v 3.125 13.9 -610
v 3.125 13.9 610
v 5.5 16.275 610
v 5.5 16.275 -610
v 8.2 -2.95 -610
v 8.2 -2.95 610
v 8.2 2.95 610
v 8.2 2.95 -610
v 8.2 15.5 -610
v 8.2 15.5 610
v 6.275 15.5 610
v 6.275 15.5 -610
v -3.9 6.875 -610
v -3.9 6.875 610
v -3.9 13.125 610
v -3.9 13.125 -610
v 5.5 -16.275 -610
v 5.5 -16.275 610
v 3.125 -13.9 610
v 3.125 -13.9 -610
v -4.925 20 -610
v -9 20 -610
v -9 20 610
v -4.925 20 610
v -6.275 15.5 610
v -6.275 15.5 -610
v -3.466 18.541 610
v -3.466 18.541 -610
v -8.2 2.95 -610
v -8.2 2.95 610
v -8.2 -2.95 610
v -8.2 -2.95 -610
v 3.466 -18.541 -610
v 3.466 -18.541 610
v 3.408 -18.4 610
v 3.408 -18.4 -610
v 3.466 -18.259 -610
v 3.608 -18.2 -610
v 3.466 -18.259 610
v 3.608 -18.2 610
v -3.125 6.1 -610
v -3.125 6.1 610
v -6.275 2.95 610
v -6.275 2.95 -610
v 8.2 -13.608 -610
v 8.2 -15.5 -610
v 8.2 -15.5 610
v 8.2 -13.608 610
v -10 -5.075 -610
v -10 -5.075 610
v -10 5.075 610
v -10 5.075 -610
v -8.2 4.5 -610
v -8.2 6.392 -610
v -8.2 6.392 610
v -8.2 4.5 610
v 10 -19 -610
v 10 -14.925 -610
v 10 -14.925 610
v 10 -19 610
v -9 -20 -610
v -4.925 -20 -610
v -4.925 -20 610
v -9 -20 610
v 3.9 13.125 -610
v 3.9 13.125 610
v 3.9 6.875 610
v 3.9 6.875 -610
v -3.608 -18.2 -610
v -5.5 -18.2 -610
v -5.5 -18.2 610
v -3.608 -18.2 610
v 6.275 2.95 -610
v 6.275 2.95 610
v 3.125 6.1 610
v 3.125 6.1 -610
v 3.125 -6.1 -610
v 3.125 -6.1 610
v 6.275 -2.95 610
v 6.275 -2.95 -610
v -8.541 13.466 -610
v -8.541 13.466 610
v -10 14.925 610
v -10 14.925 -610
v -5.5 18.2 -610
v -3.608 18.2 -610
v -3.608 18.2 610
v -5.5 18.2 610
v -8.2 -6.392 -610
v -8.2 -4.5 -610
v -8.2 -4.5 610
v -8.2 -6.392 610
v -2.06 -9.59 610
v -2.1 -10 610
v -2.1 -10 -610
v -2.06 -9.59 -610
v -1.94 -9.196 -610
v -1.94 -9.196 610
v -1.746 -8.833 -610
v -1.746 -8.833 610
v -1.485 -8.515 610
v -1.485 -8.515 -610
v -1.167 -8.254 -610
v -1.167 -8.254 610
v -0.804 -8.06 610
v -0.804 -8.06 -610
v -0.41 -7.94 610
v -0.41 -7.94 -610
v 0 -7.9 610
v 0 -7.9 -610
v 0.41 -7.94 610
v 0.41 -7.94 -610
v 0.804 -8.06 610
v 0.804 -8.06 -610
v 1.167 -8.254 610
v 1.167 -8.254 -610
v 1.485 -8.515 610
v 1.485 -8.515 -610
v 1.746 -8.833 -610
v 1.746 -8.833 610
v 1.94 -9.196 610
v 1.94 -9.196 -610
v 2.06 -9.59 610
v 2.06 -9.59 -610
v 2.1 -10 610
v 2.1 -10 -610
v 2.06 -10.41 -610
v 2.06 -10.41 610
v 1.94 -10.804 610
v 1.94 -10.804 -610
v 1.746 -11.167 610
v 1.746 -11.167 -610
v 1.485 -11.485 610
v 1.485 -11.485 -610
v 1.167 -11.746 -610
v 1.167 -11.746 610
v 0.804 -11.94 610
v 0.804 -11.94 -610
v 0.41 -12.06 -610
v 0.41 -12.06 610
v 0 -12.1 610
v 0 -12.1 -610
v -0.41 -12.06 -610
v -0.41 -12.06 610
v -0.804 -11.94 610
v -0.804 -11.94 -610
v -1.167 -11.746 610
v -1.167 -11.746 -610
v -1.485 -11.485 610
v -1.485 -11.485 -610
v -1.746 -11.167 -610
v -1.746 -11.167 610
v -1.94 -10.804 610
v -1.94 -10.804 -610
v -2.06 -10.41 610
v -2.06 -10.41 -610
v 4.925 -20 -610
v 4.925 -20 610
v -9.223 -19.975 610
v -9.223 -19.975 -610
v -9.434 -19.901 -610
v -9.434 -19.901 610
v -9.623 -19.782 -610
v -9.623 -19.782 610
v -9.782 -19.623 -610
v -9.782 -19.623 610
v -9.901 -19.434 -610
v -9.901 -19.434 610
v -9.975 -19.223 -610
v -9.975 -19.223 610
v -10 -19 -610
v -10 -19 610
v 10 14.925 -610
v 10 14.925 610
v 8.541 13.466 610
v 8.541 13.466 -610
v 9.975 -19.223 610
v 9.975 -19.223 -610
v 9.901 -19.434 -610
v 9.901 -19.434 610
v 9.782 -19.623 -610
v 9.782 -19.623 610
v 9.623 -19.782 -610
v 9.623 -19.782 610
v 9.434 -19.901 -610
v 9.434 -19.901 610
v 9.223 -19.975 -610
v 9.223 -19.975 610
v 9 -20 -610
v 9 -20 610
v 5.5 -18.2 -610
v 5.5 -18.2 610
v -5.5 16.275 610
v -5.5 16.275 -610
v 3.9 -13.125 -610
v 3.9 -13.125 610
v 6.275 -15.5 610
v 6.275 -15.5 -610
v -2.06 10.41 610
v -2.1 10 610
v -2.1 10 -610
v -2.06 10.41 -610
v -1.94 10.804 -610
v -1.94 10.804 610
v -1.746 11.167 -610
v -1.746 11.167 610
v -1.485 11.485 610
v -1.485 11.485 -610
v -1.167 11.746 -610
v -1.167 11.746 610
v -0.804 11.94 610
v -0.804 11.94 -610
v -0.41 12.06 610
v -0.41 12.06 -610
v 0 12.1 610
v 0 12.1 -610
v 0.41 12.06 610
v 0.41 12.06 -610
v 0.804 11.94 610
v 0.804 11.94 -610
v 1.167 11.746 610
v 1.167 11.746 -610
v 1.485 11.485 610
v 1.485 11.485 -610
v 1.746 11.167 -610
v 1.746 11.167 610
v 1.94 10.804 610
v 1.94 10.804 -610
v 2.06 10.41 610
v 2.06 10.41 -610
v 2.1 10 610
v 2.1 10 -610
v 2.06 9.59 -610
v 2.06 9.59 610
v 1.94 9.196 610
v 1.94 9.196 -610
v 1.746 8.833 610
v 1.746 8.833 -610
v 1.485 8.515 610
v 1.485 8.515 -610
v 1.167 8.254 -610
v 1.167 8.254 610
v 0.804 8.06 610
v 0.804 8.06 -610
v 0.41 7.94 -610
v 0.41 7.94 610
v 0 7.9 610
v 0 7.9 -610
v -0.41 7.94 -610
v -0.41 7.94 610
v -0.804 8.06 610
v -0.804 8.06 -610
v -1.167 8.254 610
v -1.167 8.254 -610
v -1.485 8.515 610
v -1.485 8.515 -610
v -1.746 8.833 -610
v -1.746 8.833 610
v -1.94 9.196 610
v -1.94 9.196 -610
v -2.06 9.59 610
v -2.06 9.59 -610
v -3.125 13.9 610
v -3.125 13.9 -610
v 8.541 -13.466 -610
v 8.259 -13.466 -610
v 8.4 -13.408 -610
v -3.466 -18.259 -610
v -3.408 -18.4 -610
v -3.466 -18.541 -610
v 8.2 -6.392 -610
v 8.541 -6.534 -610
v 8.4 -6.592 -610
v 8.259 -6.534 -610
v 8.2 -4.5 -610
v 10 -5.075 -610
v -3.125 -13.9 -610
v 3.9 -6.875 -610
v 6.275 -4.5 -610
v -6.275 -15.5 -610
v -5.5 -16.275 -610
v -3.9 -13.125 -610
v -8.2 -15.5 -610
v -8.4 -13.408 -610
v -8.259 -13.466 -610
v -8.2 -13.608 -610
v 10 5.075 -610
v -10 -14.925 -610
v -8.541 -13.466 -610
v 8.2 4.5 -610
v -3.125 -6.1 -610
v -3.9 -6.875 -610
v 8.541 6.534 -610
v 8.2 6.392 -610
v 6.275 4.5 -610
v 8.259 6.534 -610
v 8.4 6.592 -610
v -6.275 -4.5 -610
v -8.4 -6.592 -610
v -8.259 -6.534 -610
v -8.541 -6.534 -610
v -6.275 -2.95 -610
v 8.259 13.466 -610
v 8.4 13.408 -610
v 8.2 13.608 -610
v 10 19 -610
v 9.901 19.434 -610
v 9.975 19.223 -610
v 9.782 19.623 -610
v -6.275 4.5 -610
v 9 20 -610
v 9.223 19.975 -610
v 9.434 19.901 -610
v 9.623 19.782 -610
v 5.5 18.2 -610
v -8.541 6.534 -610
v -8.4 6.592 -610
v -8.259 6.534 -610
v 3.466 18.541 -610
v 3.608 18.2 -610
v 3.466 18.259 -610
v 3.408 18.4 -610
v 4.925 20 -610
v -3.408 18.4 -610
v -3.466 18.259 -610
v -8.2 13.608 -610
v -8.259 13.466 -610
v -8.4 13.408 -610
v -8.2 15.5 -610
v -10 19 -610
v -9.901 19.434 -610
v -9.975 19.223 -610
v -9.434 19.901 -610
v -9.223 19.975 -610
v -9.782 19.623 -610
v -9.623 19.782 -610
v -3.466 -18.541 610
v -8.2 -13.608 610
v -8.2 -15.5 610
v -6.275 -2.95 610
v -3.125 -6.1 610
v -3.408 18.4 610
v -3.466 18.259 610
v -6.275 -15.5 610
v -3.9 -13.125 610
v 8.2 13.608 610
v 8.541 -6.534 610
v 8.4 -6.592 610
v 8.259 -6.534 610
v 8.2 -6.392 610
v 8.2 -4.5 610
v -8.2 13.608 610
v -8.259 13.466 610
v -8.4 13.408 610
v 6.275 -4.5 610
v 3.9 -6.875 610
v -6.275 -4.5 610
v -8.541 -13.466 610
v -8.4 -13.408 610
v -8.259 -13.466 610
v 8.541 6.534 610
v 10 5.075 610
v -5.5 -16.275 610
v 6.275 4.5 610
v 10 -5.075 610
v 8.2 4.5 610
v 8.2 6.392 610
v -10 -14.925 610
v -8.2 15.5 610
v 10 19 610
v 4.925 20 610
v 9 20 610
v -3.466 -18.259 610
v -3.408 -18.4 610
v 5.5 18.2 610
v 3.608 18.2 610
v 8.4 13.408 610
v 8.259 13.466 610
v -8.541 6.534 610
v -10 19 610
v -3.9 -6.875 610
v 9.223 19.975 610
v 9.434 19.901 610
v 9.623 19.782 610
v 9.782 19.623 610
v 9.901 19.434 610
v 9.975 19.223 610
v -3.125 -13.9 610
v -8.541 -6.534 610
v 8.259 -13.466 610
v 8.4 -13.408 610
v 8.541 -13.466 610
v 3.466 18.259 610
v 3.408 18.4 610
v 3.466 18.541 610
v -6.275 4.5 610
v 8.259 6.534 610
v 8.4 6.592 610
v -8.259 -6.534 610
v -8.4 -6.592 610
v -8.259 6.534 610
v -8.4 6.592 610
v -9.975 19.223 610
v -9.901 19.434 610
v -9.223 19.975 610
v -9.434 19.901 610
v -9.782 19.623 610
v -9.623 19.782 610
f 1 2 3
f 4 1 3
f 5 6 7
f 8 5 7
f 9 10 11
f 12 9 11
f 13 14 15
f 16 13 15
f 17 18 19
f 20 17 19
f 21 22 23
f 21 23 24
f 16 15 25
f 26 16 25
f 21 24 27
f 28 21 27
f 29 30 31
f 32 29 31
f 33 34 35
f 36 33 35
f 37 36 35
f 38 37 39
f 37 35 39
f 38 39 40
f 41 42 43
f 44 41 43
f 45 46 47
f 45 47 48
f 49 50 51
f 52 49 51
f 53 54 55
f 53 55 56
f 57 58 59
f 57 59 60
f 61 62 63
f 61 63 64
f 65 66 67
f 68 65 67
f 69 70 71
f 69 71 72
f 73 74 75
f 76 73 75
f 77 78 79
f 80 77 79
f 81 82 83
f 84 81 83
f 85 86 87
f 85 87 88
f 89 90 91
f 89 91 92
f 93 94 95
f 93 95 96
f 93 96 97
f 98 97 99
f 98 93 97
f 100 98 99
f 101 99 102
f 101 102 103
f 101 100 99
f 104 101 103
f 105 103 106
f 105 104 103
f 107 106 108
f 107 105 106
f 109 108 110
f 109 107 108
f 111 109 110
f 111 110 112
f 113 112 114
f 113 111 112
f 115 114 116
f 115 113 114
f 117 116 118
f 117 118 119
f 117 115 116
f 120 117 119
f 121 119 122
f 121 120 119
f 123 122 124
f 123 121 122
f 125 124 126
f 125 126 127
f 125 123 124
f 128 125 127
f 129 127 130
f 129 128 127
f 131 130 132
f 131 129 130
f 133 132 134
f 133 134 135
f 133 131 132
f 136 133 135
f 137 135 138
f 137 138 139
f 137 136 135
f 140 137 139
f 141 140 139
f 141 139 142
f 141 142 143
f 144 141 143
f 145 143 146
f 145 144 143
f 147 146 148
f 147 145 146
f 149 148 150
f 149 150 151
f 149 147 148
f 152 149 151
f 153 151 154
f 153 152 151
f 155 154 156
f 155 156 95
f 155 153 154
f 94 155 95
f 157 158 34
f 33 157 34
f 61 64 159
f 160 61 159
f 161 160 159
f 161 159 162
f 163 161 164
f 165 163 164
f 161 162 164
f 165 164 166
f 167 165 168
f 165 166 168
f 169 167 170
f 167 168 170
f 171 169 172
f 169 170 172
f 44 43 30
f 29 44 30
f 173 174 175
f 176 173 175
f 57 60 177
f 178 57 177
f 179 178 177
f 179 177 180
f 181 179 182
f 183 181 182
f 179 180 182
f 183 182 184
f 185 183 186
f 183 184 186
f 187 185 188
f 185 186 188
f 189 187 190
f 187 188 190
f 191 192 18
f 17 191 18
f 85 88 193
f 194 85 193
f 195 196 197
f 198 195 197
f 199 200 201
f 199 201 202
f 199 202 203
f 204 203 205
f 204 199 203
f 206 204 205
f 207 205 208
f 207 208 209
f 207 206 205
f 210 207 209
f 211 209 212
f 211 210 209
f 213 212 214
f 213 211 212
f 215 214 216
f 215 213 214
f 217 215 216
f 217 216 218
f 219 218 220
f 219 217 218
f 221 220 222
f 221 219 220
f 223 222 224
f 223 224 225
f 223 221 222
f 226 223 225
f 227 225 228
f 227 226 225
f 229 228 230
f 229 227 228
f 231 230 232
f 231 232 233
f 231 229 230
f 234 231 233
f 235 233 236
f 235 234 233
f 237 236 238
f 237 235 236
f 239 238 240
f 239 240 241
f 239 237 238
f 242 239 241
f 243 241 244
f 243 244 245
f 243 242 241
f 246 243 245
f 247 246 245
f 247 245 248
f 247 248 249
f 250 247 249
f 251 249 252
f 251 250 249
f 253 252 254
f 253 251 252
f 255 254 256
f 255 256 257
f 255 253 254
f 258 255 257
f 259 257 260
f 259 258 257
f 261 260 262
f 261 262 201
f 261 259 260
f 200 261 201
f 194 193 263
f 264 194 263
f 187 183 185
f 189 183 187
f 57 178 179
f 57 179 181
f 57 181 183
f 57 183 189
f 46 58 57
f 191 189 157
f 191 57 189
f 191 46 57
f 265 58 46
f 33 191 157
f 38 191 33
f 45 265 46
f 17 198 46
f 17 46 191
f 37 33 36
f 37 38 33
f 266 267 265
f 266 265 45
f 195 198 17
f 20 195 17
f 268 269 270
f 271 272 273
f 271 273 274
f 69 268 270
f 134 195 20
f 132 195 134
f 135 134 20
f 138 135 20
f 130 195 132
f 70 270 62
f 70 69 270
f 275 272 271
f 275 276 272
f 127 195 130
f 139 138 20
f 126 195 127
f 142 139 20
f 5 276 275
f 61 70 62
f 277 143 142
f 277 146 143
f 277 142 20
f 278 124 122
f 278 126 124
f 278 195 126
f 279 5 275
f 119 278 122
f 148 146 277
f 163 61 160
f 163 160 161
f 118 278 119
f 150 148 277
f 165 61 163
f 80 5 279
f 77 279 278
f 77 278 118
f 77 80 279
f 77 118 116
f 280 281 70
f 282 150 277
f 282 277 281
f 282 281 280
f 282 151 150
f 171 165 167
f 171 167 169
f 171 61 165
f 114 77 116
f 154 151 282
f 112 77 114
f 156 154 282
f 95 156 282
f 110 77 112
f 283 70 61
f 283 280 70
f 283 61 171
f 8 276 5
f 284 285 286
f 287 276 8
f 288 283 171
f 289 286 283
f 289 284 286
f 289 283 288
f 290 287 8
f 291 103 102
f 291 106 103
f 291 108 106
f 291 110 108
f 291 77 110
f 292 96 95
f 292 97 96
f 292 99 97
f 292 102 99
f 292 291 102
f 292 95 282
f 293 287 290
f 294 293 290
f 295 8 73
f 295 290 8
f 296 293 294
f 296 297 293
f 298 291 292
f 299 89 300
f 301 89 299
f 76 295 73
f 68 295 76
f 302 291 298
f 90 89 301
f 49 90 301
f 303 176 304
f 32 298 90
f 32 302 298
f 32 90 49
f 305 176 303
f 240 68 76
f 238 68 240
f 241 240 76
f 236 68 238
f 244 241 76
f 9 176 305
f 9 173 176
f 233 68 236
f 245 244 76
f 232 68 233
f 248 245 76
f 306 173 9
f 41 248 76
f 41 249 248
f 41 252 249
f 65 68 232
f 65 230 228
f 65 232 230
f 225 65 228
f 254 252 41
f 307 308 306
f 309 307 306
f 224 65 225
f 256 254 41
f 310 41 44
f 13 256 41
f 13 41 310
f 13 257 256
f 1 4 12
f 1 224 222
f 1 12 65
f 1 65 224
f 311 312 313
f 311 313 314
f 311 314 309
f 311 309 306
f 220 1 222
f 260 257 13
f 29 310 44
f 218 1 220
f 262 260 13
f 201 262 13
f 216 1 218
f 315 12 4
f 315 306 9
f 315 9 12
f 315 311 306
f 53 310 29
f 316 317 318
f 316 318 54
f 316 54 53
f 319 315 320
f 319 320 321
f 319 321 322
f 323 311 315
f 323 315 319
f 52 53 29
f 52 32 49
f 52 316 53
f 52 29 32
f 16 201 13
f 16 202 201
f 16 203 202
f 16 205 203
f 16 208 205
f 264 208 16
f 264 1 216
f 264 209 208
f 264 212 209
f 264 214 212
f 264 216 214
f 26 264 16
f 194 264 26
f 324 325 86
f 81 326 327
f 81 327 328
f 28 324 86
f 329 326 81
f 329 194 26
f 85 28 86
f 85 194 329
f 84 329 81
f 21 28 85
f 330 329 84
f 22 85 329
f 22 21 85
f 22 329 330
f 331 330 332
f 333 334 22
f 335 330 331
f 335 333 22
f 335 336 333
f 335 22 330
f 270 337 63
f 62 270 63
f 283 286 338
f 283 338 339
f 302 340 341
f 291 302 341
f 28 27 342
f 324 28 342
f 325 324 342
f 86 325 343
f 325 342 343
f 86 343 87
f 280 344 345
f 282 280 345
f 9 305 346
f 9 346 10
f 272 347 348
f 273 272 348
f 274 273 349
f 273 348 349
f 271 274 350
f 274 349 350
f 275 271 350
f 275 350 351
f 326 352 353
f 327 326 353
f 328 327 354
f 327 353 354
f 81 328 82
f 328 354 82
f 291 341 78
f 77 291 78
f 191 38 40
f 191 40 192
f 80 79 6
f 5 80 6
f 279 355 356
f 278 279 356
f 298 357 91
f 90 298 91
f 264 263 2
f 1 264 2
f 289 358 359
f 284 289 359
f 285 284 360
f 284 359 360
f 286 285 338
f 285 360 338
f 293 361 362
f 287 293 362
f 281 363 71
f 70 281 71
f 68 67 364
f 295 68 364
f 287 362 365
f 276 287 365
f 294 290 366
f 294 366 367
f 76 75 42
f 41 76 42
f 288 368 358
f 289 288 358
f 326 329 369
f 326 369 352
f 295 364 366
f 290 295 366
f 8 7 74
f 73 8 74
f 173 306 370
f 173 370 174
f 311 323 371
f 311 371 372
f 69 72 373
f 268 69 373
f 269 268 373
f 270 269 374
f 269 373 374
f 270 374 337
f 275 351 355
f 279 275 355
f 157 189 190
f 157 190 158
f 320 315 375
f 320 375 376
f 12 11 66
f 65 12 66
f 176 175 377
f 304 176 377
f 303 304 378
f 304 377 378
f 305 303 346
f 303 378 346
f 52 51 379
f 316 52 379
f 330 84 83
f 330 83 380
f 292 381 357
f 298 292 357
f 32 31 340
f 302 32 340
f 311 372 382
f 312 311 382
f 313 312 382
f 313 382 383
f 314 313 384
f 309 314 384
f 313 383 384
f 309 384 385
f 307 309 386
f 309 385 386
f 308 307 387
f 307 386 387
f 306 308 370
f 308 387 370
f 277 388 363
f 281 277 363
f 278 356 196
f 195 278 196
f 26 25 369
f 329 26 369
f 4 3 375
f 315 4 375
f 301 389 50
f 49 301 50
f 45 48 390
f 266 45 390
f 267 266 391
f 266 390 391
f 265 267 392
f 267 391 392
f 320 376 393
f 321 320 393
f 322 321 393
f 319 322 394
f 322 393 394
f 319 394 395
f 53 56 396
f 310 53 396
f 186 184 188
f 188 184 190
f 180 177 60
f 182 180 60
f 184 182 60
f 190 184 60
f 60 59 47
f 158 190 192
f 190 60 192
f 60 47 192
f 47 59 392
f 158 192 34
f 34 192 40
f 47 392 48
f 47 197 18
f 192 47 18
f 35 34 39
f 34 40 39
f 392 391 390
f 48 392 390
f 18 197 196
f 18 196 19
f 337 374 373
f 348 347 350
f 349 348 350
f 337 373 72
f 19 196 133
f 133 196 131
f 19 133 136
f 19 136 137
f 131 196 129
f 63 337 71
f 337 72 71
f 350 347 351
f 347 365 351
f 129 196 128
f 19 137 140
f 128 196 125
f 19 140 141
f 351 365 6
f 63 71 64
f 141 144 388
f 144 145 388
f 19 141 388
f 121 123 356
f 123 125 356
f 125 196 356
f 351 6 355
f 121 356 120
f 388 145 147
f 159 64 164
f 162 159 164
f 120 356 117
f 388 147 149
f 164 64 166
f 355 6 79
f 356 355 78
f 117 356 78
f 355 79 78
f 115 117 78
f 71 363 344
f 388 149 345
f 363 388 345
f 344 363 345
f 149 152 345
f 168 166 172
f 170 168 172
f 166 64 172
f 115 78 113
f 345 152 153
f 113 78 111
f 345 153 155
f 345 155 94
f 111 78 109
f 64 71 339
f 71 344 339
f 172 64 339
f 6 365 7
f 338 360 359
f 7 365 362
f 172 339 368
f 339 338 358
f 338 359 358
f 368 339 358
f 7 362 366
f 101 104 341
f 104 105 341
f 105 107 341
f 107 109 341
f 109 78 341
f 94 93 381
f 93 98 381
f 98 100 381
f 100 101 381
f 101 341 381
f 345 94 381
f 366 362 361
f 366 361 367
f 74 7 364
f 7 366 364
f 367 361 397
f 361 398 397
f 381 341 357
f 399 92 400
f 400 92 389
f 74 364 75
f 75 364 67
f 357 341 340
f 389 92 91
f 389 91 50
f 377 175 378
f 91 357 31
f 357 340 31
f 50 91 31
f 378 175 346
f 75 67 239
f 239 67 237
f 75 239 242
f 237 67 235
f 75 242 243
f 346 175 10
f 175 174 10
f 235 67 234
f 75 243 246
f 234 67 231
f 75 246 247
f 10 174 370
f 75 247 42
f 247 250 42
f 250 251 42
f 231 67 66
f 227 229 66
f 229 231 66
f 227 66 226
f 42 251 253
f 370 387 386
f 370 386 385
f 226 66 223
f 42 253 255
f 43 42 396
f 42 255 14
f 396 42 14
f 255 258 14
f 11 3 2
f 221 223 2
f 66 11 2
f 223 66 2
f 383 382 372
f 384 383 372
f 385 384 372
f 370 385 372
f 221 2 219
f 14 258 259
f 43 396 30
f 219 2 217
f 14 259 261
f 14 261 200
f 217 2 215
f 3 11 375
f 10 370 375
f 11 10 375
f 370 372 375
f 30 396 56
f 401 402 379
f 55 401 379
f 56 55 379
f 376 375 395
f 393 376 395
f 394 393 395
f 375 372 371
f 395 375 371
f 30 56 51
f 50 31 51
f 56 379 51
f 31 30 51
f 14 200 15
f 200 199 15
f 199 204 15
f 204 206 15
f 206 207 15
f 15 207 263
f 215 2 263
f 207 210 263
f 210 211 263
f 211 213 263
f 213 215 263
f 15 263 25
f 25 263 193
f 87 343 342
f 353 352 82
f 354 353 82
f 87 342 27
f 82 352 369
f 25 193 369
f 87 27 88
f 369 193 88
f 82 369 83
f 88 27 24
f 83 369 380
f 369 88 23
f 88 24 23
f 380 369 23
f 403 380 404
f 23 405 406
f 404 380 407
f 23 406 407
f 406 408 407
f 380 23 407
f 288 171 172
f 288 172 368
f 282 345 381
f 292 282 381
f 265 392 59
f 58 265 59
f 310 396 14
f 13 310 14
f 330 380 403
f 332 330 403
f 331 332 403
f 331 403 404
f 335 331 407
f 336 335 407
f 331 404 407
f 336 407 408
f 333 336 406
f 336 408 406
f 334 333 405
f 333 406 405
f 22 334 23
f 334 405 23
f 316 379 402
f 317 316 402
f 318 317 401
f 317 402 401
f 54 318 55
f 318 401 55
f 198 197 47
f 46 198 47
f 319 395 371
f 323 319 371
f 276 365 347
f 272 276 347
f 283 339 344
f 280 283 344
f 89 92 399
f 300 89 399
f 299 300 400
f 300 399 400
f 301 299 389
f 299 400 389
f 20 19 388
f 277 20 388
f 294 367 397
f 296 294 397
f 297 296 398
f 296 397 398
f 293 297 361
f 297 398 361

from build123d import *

# Parameters (mm, degrees)
SKETCH11_R             = 2.1
VSLOT2040_2040_1_DEPTH = 1220


with BuildPart() as part:
    # Sketch11 → Vslot2040 2040(1) (new body)
    with BuildSketch(Plane(origin=(0, 0, 610), x_dir=(-1, 0, 0), z_dir=(0, 0, -1))):
        with BuildLine():
            Line((5.5, -18.2), (3.607842712, -18.2))
            ThreePointArc((3.607842712, -18.2), (3.423066806, -18.323463314), (3.466421356, -18.541421356))
            Line((3.466421356, -18.541421356), (4.925, -20))
            Line((4.925, -20), (9, -20))
            ThreePointArc((9, -20), (9.707106781, -19.707106781), (10, -19))
            Line((10, -19), (10, -14.925))
            Line((10, -14.925), (8.541421356, -13.466421356))
            ThreePointArc((8.541421356, -13.466421356), (8.323463314, -13.423066806), (8.2, -13.607842712))
            Line((8.2, -13.607842712), (8.2, -15.5))
            Line((8.2, -15.5), (6.275, -15.5))
            Line((6.275, -15.5), (3.9, -13.125))
            Line((3.9, -13.125), (3.9, -6.875))
            Line((3.9, -6.875), (6.275, -4.5))
            Line((6.275, -4.5), (8.2, -4.5))
            Line((8.2, -4.5), (8.2, -6.392157288))
            ThreePointArc((8.2, -6.392157288), (8.323463314, -6.576933194), (8.541421356, -6.533578644))
            Line((8.541421356, -6.533578644), (10, -5.075))
            Line((10, -5.075), (10, 5.075))
            Line((10, 5.075), (8.541421356, 6.533578644))
            ThreePointArc((8.541421356, 6.533578644), (8.323463314, 6.576933194), (8.2, 6.392157288))
            Line((8.2, 6.392157288), (8.2, 4.5))
            Line((8.2, 4.5), (6.275, 4.5))
            Line((6.275, 4.5), (3.9, 6.875))
            Line((3.9, 6.875), (3.9, 13.125))
            Line((3.9, 13.125), (6.275, 15.5))
            Line((6.275, 15.5), (8.2, 15.5))
            Line((8.2, 15.5), (8.2, 13.607842712))
            ThreePointArc((8.2, 13.607842712), (8.323463314, 13.423066806), (8.541421356, 13.466421356))
            Line((8.541421356, 13.466421356), (10, 14.925))
            Line((10, 14.925), (10, 19))
            ThreePointArc((10, 19), (9.707106781, 19.707106781), (9, 20))
            Line((9, 20), (4.925, 20))
            Line((4.925, 20), (3.466421356, 18.541421356))
            ThreePointArc((3.466421356, 18.541421356), (3.423066806, 18.323463314), (3.607842712, 18.2))
            Line((3.607842712, 18.2), (5.5, 18.2))
            Line((5.5, 18.2), (5.5, 16.275))
            Line((5.5, 16.275), (3.125, 13.9))
            Line((3.125, 13.9), (-3.125, 13.9))
            Line((-3.125, 13.9), (-5.5, 16.275))
            Line((-5.5, 16.275), (-5.5, 18.2))
            Line((-5.5, 18.2), (-3.607842712, 18.2))
            ThreePointArc((-3.607842712, 18.2), (-3.423066806, 18.323463314), (-3.466421356, 18.541421356))
            Line((-3.466421356, 18.541421356), (-4.925, 20))
            Line((-4.925, 20), (-9, 20))
            ThreePointArc((-9, 20), (-9.707106781, 19.707106781), (-10, 19))
            Line((-10, 19), (-10, 14.925))
            Line((-10, 14.925), (-8.541421356, 13.466421356))
            ThreePointArc((-8.541421356, 13.466421356), (-8.323463314, 13.423066806), (-8.2, 13.607842712))
            Line((-8.2, 13.607842712), (-8.2, 15.5))
            Line((-8.2, 15.5), (-6.275, 15.5))
            Line((-6.275, 15.5), (-3.9, 13.125))
            Line((-3.9, 13.125), (-3.9, 6.875))
            Line((-3.9, 6.875), (-6.275, 4.5))
            Line((-6.275, 4.5), (-8.2, 4.5))
            Line((-8.2, 4.5), (-8.2, 6.392157288))
            ThreePointArc((-8.2, 6.392157288), (-8.323463314, 6.576933194), (-8.541421356, 6.533578644))
            Line((-8.541421356, 6.533578644), (-10, 5.075))
            Line((-10, 5.075), (-10, -5.075))
            Line((-10, -5.075), (-8.541421356, -6.533578644))
            ThreePointArc((-8.541421356, -6.533578644), (-8.323463314, -6.576933194), (-8.2, -6.392157288))
            Line((-8.2, -6.392157288), (-8.2, -4.5))
            Line((-8.2, -4.5), (-6.275, -4.5))
            Line((-6.275, -4.5), (-3.9, -6.875))
            Line((-3.9, -6.875), (-3.9, -13.125))
            Line((-3.9, -13.125), (-6.275, -15.5))
            Line((-6.275, -15.5), (-8.2, -15.5))
            Line((-8.2, -15.5), (-8.2, -13.607842712))
            ThreePointArc((-8.2, -13.607842712), (-8.323463314, -13.423066806), (-8.541421356, -13.466421356))
            Line((-8.541421356, -13.466421356), (-10, -14.925))
            Line((-10, -14.925), (-10, -19))
            ThreePointArc((-10, -19), (-9.707106781, -19.707106781), (-9, -20))
            Line((-9, -20), (-4.925, -20))
            Line((-4.925, -20), (-3.466421356, -18.541421356))
            ThreePointArc((-3.466421356, -18.541421356), (-3.423066806, -18.323463314), (-3.607842712, -18.2))
            Line((-3.607842712, -18.2), (-5.5, -18.2))
            Line((-5.5, -18.2), (-5.5, -16.275))
            Line((-5.5, -16.275), (-3.125, -13.9))
            Line((-3.125, -13.9), (3.125, -13.9))
            Line((3.125, -13.9), (5.5, -16.275))
            Line((5.5, -16.275), (5.5, -18.2))
        make_face()
        with Locations((0, -10)):
            Circle(SKETCH11_R, mode=Mode.SUBTRACT)
        with Locations((0, 10)):
            Circle(SKETCH11_R, mode=Mode.SUBTRACT)
        Polygon((3.125, 6.1), (6.275, 2.95), (8.2, 2.95), (8.2, -2.95), (6.275, -2.95), (3.125, -6.1), (-3.125, -6.1), (-6.275, -2.95), (-8.2, -2.95), (-8.2, 2.95), (-6.275, 2.95), (-3.125, 6.1), align=None, mode=Mode.SUBTRACT)
    extrude(amount=VSLOT2040_2040_1_DEPTH)


solid = part.part
